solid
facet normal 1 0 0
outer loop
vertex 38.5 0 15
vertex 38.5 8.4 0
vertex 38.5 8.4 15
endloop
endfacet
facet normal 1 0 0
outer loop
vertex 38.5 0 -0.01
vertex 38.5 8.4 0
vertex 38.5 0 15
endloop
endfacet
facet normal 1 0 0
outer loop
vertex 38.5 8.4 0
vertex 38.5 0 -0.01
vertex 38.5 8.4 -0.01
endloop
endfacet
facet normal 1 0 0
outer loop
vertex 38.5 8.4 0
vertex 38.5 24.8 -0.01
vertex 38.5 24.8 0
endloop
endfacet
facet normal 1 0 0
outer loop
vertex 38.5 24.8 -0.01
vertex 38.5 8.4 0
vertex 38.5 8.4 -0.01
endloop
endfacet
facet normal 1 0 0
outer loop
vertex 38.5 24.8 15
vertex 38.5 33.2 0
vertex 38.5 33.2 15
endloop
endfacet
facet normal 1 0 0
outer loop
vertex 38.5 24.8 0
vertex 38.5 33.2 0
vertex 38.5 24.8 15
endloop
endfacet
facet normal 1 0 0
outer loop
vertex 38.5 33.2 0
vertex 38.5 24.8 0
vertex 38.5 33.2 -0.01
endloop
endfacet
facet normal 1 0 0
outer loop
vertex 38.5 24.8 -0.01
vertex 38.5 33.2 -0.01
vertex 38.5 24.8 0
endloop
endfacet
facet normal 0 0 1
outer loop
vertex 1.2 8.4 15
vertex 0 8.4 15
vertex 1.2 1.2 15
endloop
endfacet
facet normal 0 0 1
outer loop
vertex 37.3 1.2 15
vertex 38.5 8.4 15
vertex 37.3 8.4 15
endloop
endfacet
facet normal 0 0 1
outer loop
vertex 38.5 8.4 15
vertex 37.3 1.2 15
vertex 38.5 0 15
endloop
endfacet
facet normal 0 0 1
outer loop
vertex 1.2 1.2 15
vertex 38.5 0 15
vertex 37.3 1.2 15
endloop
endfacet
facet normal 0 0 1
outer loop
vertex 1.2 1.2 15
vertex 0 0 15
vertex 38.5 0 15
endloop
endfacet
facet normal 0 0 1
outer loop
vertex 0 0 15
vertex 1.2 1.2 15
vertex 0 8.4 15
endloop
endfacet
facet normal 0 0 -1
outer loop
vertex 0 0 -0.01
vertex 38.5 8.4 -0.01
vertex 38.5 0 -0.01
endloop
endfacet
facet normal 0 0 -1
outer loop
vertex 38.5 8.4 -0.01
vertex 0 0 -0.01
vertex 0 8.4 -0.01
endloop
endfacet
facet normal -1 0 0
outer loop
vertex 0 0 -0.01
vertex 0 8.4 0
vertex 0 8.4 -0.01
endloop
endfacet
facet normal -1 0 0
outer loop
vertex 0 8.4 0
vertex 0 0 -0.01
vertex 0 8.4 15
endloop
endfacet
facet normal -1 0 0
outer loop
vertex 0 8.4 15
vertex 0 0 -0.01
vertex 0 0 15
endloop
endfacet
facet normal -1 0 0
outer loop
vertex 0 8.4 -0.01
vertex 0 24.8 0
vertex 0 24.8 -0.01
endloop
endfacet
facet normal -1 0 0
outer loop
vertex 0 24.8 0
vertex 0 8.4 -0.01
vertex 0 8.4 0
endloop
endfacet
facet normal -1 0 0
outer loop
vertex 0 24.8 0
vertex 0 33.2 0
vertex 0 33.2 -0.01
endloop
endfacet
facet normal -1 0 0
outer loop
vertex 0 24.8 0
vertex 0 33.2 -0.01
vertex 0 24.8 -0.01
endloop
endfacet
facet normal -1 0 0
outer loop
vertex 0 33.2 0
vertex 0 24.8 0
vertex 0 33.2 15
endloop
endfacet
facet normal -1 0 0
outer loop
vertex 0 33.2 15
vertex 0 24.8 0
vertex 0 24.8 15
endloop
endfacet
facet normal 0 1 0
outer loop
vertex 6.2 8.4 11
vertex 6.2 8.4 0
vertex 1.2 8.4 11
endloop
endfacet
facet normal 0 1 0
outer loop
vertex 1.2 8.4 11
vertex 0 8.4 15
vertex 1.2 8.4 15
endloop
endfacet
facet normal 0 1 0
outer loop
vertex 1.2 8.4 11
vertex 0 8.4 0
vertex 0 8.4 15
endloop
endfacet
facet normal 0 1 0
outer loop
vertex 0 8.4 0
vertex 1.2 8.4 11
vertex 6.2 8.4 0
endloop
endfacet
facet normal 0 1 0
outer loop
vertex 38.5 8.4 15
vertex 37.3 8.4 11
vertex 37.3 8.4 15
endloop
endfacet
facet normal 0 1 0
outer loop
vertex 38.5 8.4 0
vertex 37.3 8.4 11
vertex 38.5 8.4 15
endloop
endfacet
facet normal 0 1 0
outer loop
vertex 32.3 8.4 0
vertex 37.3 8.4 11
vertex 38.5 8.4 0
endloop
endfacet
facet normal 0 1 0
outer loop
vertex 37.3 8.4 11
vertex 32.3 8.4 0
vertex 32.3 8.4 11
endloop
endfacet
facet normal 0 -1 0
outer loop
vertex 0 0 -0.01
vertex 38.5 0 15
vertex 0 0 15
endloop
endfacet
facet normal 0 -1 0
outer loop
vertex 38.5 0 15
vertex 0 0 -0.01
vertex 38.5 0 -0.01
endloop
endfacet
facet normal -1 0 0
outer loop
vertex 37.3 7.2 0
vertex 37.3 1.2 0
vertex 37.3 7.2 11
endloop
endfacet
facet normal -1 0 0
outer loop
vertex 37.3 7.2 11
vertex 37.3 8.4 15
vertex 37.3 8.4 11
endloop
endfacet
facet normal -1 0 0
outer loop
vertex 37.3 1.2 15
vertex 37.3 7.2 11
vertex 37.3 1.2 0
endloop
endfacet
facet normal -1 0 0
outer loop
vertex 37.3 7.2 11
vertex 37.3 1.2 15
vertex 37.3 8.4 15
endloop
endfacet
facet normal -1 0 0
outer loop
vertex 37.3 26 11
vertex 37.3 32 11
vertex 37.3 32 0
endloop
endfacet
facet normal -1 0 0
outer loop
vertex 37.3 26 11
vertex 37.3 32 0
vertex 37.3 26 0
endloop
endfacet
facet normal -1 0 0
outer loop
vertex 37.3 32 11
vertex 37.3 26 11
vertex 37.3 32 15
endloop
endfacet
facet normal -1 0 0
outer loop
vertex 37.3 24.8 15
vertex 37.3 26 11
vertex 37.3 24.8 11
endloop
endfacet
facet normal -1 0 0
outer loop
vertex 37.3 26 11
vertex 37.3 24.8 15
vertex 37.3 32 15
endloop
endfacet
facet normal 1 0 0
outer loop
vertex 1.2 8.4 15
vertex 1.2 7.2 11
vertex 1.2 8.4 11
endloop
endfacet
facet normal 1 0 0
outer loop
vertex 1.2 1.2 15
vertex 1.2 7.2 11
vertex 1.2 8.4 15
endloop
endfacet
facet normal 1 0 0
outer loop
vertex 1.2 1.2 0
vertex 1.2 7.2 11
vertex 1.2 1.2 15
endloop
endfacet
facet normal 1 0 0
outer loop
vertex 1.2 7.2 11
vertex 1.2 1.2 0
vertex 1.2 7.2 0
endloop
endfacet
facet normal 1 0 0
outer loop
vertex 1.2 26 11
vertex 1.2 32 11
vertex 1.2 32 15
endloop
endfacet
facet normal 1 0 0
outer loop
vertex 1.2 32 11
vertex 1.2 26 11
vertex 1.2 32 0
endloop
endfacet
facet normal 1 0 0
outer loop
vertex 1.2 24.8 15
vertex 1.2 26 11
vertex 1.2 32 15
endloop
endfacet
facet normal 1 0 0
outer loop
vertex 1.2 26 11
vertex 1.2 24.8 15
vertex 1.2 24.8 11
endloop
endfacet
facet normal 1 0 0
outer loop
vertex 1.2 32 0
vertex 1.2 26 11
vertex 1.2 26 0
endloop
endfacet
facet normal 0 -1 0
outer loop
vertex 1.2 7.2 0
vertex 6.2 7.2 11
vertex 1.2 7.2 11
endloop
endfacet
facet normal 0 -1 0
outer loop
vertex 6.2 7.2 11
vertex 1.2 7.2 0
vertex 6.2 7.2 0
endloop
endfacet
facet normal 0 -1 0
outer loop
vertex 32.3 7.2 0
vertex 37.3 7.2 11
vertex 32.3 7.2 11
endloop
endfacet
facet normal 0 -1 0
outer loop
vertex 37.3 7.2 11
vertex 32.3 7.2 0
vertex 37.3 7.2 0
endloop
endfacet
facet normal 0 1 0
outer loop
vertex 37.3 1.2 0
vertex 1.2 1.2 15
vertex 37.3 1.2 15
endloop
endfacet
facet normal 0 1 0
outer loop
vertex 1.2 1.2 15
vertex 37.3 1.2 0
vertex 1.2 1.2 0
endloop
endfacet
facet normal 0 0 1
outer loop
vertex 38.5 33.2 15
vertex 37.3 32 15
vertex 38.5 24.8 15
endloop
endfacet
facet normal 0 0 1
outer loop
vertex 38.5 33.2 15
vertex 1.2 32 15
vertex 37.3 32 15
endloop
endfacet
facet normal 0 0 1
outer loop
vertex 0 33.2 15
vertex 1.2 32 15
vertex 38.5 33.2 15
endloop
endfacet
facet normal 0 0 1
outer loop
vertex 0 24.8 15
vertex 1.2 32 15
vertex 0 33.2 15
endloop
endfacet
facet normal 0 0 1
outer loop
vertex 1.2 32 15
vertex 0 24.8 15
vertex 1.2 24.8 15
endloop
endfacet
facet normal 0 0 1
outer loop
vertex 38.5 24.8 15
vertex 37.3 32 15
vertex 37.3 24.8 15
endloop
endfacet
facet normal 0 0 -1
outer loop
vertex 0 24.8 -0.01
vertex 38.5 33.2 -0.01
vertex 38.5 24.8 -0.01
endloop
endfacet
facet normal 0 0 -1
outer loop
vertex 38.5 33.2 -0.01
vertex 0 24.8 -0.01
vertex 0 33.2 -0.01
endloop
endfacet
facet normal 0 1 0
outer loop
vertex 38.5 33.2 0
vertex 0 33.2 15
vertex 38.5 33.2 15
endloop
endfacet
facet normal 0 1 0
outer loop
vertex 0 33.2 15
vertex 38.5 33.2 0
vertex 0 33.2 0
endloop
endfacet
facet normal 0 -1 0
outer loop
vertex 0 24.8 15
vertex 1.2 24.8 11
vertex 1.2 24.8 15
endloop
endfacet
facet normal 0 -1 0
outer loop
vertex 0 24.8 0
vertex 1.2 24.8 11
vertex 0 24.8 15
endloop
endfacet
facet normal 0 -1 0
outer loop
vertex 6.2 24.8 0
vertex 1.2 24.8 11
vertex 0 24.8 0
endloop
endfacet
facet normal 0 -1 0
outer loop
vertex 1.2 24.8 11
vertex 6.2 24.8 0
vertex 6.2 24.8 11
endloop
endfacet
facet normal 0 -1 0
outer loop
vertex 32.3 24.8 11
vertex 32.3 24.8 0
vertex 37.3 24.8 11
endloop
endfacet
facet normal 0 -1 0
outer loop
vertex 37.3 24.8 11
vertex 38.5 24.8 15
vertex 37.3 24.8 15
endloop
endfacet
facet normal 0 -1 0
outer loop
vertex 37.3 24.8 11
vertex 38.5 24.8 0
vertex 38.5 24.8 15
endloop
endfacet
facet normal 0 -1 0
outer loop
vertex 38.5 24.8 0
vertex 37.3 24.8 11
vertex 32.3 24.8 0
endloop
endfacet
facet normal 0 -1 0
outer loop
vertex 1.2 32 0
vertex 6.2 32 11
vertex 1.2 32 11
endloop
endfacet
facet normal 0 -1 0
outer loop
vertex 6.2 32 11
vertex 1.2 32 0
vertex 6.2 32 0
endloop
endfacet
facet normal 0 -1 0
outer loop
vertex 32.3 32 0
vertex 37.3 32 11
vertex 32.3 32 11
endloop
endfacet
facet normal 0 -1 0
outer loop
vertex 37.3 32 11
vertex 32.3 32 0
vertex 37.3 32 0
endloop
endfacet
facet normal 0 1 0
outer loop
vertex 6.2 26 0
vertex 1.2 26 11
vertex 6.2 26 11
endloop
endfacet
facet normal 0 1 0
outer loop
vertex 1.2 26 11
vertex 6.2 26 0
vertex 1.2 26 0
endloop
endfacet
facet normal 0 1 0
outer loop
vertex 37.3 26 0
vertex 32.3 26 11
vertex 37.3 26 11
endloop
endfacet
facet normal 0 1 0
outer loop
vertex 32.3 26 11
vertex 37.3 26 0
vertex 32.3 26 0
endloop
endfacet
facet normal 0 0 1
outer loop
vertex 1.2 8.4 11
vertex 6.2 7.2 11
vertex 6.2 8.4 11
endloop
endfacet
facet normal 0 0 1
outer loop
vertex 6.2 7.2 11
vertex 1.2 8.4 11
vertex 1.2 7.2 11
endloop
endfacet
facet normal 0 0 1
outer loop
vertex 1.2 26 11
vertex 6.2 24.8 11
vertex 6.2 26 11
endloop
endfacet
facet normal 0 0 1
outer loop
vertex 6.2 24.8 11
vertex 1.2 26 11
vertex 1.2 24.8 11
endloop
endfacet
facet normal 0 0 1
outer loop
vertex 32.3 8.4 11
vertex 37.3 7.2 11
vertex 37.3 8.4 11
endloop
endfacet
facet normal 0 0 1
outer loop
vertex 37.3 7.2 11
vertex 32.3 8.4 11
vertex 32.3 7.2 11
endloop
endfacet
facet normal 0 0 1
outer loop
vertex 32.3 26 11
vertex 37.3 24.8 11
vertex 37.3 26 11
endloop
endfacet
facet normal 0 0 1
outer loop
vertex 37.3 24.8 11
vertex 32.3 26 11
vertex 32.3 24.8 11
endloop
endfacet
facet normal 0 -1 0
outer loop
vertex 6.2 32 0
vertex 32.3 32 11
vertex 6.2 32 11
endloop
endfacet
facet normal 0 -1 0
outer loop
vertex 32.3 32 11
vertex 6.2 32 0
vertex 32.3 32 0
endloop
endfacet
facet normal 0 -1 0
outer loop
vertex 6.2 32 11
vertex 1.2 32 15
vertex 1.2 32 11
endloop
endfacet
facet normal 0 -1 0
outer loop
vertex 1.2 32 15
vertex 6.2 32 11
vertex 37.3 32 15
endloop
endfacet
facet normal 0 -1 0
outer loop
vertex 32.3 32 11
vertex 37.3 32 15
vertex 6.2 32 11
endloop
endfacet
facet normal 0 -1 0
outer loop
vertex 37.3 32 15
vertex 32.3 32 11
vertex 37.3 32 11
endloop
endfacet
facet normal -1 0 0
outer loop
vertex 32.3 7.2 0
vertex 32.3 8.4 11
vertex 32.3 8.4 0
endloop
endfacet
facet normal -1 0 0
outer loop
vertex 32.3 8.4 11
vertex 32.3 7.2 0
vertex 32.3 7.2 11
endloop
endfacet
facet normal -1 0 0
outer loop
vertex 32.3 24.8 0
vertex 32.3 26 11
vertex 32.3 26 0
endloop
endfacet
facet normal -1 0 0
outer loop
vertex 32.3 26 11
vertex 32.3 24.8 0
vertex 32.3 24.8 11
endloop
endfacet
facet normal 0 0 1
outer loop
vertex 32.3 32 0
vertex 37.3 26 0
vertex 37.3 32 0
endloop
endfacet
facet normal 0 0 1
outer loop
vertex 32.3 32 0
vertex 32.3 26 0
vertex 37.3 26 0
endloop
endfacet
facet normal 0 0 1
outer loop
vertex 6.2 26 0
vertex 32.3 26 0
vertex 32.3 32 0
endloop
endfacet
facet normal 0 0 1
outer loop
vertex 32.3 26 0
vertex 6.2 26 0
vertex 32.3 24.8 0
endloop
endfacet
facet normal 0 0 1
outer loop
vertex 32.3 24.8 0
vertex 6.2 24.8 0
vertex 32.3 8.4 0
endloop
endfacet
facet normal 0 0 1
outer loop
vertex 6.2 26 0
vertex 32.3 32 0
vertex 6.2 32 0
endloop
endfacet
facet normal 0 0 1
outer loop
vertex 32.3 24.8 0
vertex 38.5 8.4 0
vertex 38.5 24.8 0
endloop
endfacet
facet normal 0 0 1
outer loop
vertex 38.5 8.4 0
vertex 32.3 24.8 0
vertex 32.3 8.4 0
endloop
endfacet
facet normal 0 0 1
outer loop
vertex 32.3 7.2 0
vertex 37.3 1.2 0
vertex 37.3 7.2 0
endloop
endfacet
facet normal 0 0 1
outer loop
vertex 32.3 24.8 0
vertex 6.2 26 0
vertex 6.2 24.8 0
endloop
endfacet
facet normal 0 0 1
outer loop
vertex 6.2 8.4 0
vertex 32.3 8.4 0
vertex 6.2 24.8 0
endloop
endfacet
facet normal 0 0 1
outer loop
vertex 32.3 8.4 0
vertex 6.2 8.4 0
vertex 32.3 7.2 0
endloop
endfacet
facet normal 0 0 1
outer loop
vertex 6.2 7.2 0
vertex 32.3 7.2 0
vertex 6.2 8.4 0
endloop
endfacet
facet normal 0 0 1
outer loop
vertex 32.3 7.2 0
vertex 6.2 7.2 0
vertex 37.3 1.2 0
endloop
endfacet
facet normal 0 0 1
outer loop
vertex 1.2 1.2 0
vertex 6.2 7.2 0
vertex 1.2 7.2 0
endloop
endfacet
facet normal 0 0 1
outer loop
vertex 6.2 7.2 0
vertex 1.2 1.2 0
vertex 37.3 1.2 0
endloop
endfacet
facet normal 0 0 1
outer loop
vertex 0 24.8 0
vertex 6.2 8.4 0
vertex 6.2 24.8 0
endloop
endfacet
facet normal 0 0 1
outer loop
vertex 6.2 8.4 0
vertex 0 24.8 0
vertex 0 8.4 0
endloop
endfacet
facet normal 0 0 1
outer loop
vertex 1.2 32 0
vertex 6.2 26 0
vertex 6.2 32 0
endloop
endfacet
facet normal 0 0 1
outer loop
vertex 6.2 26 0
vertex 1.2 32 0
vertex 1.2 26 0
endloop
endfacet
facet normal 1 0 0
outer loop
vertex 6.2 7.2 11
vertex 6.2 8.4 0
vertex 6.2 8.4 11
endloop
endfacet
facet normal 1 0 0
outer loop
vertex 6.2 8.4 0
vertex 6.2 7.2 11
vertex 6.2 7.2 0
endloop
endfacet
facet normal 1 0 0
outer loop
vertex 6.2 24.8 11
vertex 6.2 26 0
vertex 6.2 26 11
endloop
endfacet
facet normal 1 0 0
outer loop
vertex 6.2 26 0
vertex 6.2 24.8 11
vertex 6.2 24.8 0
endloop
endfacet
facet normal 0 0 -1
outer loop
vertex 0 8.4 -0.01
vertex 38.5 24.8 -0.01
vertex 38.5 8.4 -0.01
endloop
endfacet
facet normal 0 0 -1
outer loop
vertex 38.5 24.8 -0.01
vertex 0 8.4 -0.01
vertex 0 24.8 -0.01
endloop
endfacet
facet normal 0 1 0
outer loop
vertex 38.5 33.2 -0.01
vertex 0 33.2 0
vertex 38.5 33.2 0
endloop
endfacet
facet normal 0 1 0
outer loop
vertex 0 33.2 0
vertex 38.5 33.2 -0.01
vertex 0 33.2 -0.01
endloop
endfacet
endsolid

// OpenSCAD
// file: ../Base/Boxes.scad
// Fischertechnik Box Foundation
// Pre-designed Boxes

use <Constants.scad>

include <PlacementOptions.scad>

box190Width = 190;
box190Depth = 130;
box130Width = 130;
box130Depth = 95;
boxUsageHeight = 33.9;
boxWallThickness = 2.4;
boxBaseThickness = 1.0;

// getBoxWallThickness()
// Gets the wall thickness of a Fischertechnik Box

function getBoxWallThickness() = boxWallThickness;

// Gets the usable height of a fischertechnik box
function getBoxUsageHeight() = boxUsageHeight;

// Gets the thickness of the Fischertechnik box base.
function getBoxBaseThickness() = boxBaseThickness;

// Gets the usable inner space of a Box 190 as an x/y-list
function getBox190Space() = [
    box190Width - 2*getBoxWallThickness(), 
    box190Depth - 2*getBoxWallThickness() ];

// Imports the Fischertechnik empty box 130x190 mm and places it at position 0,0
// 190x130 are the outer sizes, the inner space is slightly smaller. Use getBox190Space() to get the inner sizes.
// This module needs the STL file "Fischertechnik Box 130x190.stl" in the library path.
// The box is positioned that the usable inner space is at the 0,0,0 position. The

module Box190() {
    translate([-getBoxWallThickness(),-getBoxWallThickness(),-getBoxBaseThickness()])
        import("Fischertechnik Box 130x190.stl", convexity=3);
}

// Gets the usable inner space of a Box 130 as an x/y-list
function getBox130Space() = [
    box130Width - 2*getBoxWallThickness(), 
    box130Depth - 2*getBoxWallThickness() ];

// Imports the Fischertechnik empty box 95x130 mm and places it at position 0,0
// 190x130 are the outer sizes, the inner space is slightly smaller. Use getBox190Space() to get the inner sizes.
// This module needs the STL file "Fischertechnik Box 95x130.stl" in the library path.
// The box is positioned that the usable inner space is at the 0,0,0 position. The

module Box130() {
    translate([-getBoxWallThickness(),-getBoxWallThickness(),-getBoxBaseThickness()])
        import("Fischertechnik Box 95x130.stl", convexity=3);
}

// Creates a web at the specified box walls
// corner 0 = LowerLeft, 1 = UpperLeft, 2 = UpperRight, 3 = LowerRight
// side 0 = LeftOfCorner, 1 = RightOfCorner
// distance = Distance in mm from the corner
// box = inner width and depth of the box (default: Box 190)
// webWidth = length of the web (default is 3 mms)
// webThickness = thickness of the web (default is 1 mm)

module BoxWeb(corner, side, distance, box=getBox190Space(), webWidth=3, webThickness=1.0) {
    sink = getBoxWallThickness()/2;

    width = (corner % 2 == 0) ? 
            (side == LeftOfCorner ? webWidth : webThickness) :
            (side == LeftOfCorner ? webThickness : webWidth);

    depth = (corner % 2 == 0) ? 
            (side == RightOfCorner ? webWidth : webThickness) :
            (side == RightOfCorner ? webThickness : webWidth);
    
    xDiff = corner == LowerLeft ? 
                (side == LeftOfCorner ? -sink : distance) :
            (corner == UpperLeft ?                
                (side == LeftOfCorner ? distance : -sink) :
            (corner == UpperRight ?
                (side == LeftOfCorner ? box.x-webWidth+sink : box.x-distance-webThickness) :
                (side == LeftOfCorner ? box.x-distance-webThickness: box.x-webWidth+sink)));

    yDiff = corner == LowerLeft ? 
                (side == RightOfCorner ? -sink : distance) :
            (corner == UpperLeft ?
                (side == RightOfCorner ? box.y-distance : box.y-webWidth+sink) :
            (corner == UpperRight ?
                (side == RightOfCorner ? box.y-webWidth+sink : box.y-distance) :
                (side == RightOfCorner ? distance : -sink)));
    
    translate([xDiff, yDiff, -getExcess()])
        cube([width, depth, boxUsageHeight + 2*getExcess()]);
}
// file: ../Base/Rotation.scad
// Fischertechnik Box Foundation
// Geometry Helpers Rotation

include <PlacementOptions.scad>

// getRotatedSpace(space, rotation=NoRotation)
// Rotates the space dependent on the specified rotation

function getRotatedSpace(space, rotation=NoRotation) = [
    (rotation == Rotate90 || rotation == Rotate270) ? space.y : space.x,
    (rotation == Rotate90 || rotation == Rotate270) ? space.x : space.y
];

// Rotates the given space around the fixed left lower corner
// space = the space the children needs as width/depth list [width,depth]
// rotation = 0 Rotate0 degrees, 1 Rotate90 degrees, 2 Rotate180 degrees, 3 Rotate270 degrees (equivalent to -90)

module RotateFix(space, rotation=Rotate0) {
    dy = (rotation == Rotate0 || rotation == Rotate270) ? 0 :
        (rotation == Rotate90) ? space.x :
        space.y;
    dx = (rotation < Rotate180) ? 0 :
        (rotation == Rotate180) ? space.x :
        space.y;
    
    translate([dx, dy, 0])
        rotate([0, 0, rotations[rotation]])
            children();
}
// file: ../Base/Alignment.scad
// Fischertechnik Box Foundation
// Geometry Helpers Alignment

include <PlacementOptions.scad>

// getAlignedX(elementWidth, spaceWidth, align=AlignRight, offset=0)
// Gets the aligned X offset of an element with the given
// width in the given space.
// elementWidth = The width of the element to positon
// spaceWidth = The space where the element should be aligned
// align = 0 AlignLeft, 1 AlignCenter, 2 AlignRight
// offset = an optional offset from the aligned position. When
// aligned left or centered, then positive values are in X direction.
// When aligned right then positive values are in negative X direction.

function getAlignedX(elementWidth, spaceWidth, align=AlignRight, offset=0) =
    (align == AlignLeft) ?
        offset :
        ((align == AlignCenter) ?
        (spaceWidth - elementWidth)/2 + offset :
        spaceWidth - offset - elementWidth);

// getAlignedY(elementDepth, spaceDepth, align=AlignTop, offset=0)
// Gets the aligned Y offset of an element with the given
// depth in the given space.
// elementDepth = The depth of the element to positon
// spaceDepth = The space where the element should be aligned
// align = 0 AlignBottom, 1 AlignCenter, 2 AlignTop
// offset = an optional offset from the aligned position. When
// aligned bottom or centered, then positive values are in Y direction.
// When aligned top then positive values are in negative Y direction.

function getAlignedY(elementDepth, spaceDepth, align=AlignTop, offset=0) =
    (align == AlignBottom) ?
        offset :
        ((align == AlignCenter) ?
        (spaceDepth - elementDepth)/2 + offset :
        spaceDepth - offset - elementDepth);
// file: ../Base/PlacementOptions.scad
// Fischertechnik Box Foundation
// Placement Options

// Alignment
NoAlign = 0;
AlignLeft = 1;
AlignBottom = 2;
AlignCenter = 3;
AlignRight = 4;
AlignTop = 5;

// Element rotation degree steps
rotations = [0, -90, -180, -270];

// Rotation
NoRotation = 0;
Rotate0 = 0;
Rotate90 = 1;
Rotate180 = 2;
Rotate270 = 3;

// Docking (seen from above)
NoDock = -1;
DockLeft = 0;
DockTop = 1;
DockRight = 2;
DockCorner = 2;
DockBottom = 3;

// Web corners
LowerLeft = 0;
UpperLeft = 1;
UpperRight = 2;
LowerRight = 3;

// Web position relative to corner
LeftOfCorner = 0;
RightOfCorner = 1;
// file: ../Base/Placement.scad
// Fischertechnik Box Foundation
// Geometry Helpers Placement

use <Constants.scad>
use <Alignment.scad>
use <Rotation.scad>
use <Boxes.scad>

include <PlacementOptions.scad>

// Place(x=0, y=0, elementSpace=[0,0], alignX=AlignLeft, alignY=AlignBottom, rotation=Rotate0, boxSpace=getBox190Space())
// Places the child at the specified position
// y = Y-Position. This is a relative position when an X aligment is specified.
// x = X-Position. This is a relative position when an Y aligment is specified.
// elementSpace = space of the element to be placed [x,y]
// alignX = -1=NoAlign, 0 AlignLeft, 1 AlignCenter, 3 AlignRight (elementSpace and boxSpace required!)
// alignY = -1=NoAlign, 2 AlignBottom, 1 AlignCenter, 4 AlignTop (elementSpace and boxSpace required!)
// rotation = 0 Rotate0 0 degrees, 1 Rotate90 90 degrees, 
// 2 Rotate180 180 degrees, 3 Rotate270 270 degrees (equivalent to -90)
// boxSpace = Inner space of the box where the placement occurs [x,y] - default is Box 190x130 inner space

module Place(x=0, y=0, elementSpace=[0,0], 
  alignX=AlignLeft, alignY=AlignBottom, 
  rotation=NoRotation, boxSpace=getBox190Space()) {

    module Position(x, y, space, rotation=Rotate0) {
        translate([x, y, 0])
            RotateFix(space, rotation)
                children(0);
    }

    space = getRotatedSpace(elementSpace, rotation);
    alignedX = getAlignedX(space.x, boxSpace.x, alignX, x);
    alignedY = getAlignedY(space.y, boxSpace.y, alignY, y);
    Position(alignedX, alignedY, elementSpace, rotation)
        children(0);
}

// Center(space=getBox130Space(), elementSpace=[0,0])
// space = Space where the children is centered. For cylinder use centered=true and no elementSpace.
// elementSpace = space of the element to be centered [x,y]

module Center(space=getBox190Space(), elementSpace=[0,0]) {
    translate([(space.x - elementSpace.x) / 2, (space.y - elementSpace.y) / 2])
        children(0);
}

// CenterHorizontal(width=0, y=0, offset=0, space=getBox130Space())
// space = Space where the children is centered. For cylinder use centered=true and no elementSpace.
// elementSpace = space of the element to be centered [x,y]

module CenterHorizontal(width=0, y=0, offset=0, space=getBox190Space()) {
    translate([(space.x - width) / 2 + offset, y])
        children(0);
}

// CenterVertical(depth=0, x=0, offset=0, space=getBox130Space())
// space = Space where the children is centered. For cylinder use centered=true and no elementSpace.
// elementSpace = space of the element to be centered [x,y]

module CenterVerticalal(depth=0, x=0, offset=0, space=getBox190Space()) {
    translate([x, (space.y - depth) / 2 + offset])
        children(0);
}
// file: ../Base/Constants.scad
// Fischertechnik Box Foundation
// Constants

// Constant values necessary for multiple elements

// Base constants
dividerThickness = 1.2;
excess = 0.01;
fragments = 90;
tolerance = 0.8;

// Gets the thickness of a divider 
function getDividerThickness() = dividerThickness;

// Gets the excess that is used to merge walls into each other
function getExcess() = excess;

// Gets amount of fragments of a cylinder
function getFragments() = fragments;

// Gets the inner tolerance of a frame to each side
function getTolerance() = tolerance;


// Fischertechnik specific constants
axisDiameter = 4;
axisBottomDiameter = axisDiameter + 1;
standardEdgeDistance = 2.5;
standardWebDistance = 11.5;
standardCornerLength = 15;
tubeWallFactor = 1.6;

// Gets axis diameter
function getAxisDiameter() = axisDiameter;

// Gets axis bottom diameter for thicker part at the bottom
function getAxisBottomDiameter() = axisBottomDiameter;

// gets the standard distance to the wall of the box for dockable frames with webs
function getStandardEdgeDistance() = standardEdgeDistance;

// gets the standard distance of each web to the corner of the dockable frame
function getStandardWebDistance() = standardWebDistance;

// gets the standard length of the corner walls of a dockable frame
function getStandardCornerLength() = standardCornerLength;

// gets the wall thickness of a tube.
function getTubeWallThickness() = tubeWallFactor * getDividerThickness();
// main file
// Fischertechnik Box Library
// Frame for Concave Mirror
// 31369 

use <../Base/Constants.scad>
use <../ModelBase/Simple.scad>
use <../ModelBase/Complex.scad>

width = 35.3;
depth = 30;
height = 11;

// getFrameConcaveMirrorSpace()
// Gets the outer space the concave mirror frame needs.

function getFrameConcaveMirrorSpace() = getFrameOuterVolume([width, depth, height]);

// FrameConcaveMirror()
// Frame for 30 mm concave mirror.

module FrameConcaveMirror() {
    FrameSpecialFlat([width, depth, height]);
}

// Tests
color("lightgray") {
FrameConcaveMirror();
}
